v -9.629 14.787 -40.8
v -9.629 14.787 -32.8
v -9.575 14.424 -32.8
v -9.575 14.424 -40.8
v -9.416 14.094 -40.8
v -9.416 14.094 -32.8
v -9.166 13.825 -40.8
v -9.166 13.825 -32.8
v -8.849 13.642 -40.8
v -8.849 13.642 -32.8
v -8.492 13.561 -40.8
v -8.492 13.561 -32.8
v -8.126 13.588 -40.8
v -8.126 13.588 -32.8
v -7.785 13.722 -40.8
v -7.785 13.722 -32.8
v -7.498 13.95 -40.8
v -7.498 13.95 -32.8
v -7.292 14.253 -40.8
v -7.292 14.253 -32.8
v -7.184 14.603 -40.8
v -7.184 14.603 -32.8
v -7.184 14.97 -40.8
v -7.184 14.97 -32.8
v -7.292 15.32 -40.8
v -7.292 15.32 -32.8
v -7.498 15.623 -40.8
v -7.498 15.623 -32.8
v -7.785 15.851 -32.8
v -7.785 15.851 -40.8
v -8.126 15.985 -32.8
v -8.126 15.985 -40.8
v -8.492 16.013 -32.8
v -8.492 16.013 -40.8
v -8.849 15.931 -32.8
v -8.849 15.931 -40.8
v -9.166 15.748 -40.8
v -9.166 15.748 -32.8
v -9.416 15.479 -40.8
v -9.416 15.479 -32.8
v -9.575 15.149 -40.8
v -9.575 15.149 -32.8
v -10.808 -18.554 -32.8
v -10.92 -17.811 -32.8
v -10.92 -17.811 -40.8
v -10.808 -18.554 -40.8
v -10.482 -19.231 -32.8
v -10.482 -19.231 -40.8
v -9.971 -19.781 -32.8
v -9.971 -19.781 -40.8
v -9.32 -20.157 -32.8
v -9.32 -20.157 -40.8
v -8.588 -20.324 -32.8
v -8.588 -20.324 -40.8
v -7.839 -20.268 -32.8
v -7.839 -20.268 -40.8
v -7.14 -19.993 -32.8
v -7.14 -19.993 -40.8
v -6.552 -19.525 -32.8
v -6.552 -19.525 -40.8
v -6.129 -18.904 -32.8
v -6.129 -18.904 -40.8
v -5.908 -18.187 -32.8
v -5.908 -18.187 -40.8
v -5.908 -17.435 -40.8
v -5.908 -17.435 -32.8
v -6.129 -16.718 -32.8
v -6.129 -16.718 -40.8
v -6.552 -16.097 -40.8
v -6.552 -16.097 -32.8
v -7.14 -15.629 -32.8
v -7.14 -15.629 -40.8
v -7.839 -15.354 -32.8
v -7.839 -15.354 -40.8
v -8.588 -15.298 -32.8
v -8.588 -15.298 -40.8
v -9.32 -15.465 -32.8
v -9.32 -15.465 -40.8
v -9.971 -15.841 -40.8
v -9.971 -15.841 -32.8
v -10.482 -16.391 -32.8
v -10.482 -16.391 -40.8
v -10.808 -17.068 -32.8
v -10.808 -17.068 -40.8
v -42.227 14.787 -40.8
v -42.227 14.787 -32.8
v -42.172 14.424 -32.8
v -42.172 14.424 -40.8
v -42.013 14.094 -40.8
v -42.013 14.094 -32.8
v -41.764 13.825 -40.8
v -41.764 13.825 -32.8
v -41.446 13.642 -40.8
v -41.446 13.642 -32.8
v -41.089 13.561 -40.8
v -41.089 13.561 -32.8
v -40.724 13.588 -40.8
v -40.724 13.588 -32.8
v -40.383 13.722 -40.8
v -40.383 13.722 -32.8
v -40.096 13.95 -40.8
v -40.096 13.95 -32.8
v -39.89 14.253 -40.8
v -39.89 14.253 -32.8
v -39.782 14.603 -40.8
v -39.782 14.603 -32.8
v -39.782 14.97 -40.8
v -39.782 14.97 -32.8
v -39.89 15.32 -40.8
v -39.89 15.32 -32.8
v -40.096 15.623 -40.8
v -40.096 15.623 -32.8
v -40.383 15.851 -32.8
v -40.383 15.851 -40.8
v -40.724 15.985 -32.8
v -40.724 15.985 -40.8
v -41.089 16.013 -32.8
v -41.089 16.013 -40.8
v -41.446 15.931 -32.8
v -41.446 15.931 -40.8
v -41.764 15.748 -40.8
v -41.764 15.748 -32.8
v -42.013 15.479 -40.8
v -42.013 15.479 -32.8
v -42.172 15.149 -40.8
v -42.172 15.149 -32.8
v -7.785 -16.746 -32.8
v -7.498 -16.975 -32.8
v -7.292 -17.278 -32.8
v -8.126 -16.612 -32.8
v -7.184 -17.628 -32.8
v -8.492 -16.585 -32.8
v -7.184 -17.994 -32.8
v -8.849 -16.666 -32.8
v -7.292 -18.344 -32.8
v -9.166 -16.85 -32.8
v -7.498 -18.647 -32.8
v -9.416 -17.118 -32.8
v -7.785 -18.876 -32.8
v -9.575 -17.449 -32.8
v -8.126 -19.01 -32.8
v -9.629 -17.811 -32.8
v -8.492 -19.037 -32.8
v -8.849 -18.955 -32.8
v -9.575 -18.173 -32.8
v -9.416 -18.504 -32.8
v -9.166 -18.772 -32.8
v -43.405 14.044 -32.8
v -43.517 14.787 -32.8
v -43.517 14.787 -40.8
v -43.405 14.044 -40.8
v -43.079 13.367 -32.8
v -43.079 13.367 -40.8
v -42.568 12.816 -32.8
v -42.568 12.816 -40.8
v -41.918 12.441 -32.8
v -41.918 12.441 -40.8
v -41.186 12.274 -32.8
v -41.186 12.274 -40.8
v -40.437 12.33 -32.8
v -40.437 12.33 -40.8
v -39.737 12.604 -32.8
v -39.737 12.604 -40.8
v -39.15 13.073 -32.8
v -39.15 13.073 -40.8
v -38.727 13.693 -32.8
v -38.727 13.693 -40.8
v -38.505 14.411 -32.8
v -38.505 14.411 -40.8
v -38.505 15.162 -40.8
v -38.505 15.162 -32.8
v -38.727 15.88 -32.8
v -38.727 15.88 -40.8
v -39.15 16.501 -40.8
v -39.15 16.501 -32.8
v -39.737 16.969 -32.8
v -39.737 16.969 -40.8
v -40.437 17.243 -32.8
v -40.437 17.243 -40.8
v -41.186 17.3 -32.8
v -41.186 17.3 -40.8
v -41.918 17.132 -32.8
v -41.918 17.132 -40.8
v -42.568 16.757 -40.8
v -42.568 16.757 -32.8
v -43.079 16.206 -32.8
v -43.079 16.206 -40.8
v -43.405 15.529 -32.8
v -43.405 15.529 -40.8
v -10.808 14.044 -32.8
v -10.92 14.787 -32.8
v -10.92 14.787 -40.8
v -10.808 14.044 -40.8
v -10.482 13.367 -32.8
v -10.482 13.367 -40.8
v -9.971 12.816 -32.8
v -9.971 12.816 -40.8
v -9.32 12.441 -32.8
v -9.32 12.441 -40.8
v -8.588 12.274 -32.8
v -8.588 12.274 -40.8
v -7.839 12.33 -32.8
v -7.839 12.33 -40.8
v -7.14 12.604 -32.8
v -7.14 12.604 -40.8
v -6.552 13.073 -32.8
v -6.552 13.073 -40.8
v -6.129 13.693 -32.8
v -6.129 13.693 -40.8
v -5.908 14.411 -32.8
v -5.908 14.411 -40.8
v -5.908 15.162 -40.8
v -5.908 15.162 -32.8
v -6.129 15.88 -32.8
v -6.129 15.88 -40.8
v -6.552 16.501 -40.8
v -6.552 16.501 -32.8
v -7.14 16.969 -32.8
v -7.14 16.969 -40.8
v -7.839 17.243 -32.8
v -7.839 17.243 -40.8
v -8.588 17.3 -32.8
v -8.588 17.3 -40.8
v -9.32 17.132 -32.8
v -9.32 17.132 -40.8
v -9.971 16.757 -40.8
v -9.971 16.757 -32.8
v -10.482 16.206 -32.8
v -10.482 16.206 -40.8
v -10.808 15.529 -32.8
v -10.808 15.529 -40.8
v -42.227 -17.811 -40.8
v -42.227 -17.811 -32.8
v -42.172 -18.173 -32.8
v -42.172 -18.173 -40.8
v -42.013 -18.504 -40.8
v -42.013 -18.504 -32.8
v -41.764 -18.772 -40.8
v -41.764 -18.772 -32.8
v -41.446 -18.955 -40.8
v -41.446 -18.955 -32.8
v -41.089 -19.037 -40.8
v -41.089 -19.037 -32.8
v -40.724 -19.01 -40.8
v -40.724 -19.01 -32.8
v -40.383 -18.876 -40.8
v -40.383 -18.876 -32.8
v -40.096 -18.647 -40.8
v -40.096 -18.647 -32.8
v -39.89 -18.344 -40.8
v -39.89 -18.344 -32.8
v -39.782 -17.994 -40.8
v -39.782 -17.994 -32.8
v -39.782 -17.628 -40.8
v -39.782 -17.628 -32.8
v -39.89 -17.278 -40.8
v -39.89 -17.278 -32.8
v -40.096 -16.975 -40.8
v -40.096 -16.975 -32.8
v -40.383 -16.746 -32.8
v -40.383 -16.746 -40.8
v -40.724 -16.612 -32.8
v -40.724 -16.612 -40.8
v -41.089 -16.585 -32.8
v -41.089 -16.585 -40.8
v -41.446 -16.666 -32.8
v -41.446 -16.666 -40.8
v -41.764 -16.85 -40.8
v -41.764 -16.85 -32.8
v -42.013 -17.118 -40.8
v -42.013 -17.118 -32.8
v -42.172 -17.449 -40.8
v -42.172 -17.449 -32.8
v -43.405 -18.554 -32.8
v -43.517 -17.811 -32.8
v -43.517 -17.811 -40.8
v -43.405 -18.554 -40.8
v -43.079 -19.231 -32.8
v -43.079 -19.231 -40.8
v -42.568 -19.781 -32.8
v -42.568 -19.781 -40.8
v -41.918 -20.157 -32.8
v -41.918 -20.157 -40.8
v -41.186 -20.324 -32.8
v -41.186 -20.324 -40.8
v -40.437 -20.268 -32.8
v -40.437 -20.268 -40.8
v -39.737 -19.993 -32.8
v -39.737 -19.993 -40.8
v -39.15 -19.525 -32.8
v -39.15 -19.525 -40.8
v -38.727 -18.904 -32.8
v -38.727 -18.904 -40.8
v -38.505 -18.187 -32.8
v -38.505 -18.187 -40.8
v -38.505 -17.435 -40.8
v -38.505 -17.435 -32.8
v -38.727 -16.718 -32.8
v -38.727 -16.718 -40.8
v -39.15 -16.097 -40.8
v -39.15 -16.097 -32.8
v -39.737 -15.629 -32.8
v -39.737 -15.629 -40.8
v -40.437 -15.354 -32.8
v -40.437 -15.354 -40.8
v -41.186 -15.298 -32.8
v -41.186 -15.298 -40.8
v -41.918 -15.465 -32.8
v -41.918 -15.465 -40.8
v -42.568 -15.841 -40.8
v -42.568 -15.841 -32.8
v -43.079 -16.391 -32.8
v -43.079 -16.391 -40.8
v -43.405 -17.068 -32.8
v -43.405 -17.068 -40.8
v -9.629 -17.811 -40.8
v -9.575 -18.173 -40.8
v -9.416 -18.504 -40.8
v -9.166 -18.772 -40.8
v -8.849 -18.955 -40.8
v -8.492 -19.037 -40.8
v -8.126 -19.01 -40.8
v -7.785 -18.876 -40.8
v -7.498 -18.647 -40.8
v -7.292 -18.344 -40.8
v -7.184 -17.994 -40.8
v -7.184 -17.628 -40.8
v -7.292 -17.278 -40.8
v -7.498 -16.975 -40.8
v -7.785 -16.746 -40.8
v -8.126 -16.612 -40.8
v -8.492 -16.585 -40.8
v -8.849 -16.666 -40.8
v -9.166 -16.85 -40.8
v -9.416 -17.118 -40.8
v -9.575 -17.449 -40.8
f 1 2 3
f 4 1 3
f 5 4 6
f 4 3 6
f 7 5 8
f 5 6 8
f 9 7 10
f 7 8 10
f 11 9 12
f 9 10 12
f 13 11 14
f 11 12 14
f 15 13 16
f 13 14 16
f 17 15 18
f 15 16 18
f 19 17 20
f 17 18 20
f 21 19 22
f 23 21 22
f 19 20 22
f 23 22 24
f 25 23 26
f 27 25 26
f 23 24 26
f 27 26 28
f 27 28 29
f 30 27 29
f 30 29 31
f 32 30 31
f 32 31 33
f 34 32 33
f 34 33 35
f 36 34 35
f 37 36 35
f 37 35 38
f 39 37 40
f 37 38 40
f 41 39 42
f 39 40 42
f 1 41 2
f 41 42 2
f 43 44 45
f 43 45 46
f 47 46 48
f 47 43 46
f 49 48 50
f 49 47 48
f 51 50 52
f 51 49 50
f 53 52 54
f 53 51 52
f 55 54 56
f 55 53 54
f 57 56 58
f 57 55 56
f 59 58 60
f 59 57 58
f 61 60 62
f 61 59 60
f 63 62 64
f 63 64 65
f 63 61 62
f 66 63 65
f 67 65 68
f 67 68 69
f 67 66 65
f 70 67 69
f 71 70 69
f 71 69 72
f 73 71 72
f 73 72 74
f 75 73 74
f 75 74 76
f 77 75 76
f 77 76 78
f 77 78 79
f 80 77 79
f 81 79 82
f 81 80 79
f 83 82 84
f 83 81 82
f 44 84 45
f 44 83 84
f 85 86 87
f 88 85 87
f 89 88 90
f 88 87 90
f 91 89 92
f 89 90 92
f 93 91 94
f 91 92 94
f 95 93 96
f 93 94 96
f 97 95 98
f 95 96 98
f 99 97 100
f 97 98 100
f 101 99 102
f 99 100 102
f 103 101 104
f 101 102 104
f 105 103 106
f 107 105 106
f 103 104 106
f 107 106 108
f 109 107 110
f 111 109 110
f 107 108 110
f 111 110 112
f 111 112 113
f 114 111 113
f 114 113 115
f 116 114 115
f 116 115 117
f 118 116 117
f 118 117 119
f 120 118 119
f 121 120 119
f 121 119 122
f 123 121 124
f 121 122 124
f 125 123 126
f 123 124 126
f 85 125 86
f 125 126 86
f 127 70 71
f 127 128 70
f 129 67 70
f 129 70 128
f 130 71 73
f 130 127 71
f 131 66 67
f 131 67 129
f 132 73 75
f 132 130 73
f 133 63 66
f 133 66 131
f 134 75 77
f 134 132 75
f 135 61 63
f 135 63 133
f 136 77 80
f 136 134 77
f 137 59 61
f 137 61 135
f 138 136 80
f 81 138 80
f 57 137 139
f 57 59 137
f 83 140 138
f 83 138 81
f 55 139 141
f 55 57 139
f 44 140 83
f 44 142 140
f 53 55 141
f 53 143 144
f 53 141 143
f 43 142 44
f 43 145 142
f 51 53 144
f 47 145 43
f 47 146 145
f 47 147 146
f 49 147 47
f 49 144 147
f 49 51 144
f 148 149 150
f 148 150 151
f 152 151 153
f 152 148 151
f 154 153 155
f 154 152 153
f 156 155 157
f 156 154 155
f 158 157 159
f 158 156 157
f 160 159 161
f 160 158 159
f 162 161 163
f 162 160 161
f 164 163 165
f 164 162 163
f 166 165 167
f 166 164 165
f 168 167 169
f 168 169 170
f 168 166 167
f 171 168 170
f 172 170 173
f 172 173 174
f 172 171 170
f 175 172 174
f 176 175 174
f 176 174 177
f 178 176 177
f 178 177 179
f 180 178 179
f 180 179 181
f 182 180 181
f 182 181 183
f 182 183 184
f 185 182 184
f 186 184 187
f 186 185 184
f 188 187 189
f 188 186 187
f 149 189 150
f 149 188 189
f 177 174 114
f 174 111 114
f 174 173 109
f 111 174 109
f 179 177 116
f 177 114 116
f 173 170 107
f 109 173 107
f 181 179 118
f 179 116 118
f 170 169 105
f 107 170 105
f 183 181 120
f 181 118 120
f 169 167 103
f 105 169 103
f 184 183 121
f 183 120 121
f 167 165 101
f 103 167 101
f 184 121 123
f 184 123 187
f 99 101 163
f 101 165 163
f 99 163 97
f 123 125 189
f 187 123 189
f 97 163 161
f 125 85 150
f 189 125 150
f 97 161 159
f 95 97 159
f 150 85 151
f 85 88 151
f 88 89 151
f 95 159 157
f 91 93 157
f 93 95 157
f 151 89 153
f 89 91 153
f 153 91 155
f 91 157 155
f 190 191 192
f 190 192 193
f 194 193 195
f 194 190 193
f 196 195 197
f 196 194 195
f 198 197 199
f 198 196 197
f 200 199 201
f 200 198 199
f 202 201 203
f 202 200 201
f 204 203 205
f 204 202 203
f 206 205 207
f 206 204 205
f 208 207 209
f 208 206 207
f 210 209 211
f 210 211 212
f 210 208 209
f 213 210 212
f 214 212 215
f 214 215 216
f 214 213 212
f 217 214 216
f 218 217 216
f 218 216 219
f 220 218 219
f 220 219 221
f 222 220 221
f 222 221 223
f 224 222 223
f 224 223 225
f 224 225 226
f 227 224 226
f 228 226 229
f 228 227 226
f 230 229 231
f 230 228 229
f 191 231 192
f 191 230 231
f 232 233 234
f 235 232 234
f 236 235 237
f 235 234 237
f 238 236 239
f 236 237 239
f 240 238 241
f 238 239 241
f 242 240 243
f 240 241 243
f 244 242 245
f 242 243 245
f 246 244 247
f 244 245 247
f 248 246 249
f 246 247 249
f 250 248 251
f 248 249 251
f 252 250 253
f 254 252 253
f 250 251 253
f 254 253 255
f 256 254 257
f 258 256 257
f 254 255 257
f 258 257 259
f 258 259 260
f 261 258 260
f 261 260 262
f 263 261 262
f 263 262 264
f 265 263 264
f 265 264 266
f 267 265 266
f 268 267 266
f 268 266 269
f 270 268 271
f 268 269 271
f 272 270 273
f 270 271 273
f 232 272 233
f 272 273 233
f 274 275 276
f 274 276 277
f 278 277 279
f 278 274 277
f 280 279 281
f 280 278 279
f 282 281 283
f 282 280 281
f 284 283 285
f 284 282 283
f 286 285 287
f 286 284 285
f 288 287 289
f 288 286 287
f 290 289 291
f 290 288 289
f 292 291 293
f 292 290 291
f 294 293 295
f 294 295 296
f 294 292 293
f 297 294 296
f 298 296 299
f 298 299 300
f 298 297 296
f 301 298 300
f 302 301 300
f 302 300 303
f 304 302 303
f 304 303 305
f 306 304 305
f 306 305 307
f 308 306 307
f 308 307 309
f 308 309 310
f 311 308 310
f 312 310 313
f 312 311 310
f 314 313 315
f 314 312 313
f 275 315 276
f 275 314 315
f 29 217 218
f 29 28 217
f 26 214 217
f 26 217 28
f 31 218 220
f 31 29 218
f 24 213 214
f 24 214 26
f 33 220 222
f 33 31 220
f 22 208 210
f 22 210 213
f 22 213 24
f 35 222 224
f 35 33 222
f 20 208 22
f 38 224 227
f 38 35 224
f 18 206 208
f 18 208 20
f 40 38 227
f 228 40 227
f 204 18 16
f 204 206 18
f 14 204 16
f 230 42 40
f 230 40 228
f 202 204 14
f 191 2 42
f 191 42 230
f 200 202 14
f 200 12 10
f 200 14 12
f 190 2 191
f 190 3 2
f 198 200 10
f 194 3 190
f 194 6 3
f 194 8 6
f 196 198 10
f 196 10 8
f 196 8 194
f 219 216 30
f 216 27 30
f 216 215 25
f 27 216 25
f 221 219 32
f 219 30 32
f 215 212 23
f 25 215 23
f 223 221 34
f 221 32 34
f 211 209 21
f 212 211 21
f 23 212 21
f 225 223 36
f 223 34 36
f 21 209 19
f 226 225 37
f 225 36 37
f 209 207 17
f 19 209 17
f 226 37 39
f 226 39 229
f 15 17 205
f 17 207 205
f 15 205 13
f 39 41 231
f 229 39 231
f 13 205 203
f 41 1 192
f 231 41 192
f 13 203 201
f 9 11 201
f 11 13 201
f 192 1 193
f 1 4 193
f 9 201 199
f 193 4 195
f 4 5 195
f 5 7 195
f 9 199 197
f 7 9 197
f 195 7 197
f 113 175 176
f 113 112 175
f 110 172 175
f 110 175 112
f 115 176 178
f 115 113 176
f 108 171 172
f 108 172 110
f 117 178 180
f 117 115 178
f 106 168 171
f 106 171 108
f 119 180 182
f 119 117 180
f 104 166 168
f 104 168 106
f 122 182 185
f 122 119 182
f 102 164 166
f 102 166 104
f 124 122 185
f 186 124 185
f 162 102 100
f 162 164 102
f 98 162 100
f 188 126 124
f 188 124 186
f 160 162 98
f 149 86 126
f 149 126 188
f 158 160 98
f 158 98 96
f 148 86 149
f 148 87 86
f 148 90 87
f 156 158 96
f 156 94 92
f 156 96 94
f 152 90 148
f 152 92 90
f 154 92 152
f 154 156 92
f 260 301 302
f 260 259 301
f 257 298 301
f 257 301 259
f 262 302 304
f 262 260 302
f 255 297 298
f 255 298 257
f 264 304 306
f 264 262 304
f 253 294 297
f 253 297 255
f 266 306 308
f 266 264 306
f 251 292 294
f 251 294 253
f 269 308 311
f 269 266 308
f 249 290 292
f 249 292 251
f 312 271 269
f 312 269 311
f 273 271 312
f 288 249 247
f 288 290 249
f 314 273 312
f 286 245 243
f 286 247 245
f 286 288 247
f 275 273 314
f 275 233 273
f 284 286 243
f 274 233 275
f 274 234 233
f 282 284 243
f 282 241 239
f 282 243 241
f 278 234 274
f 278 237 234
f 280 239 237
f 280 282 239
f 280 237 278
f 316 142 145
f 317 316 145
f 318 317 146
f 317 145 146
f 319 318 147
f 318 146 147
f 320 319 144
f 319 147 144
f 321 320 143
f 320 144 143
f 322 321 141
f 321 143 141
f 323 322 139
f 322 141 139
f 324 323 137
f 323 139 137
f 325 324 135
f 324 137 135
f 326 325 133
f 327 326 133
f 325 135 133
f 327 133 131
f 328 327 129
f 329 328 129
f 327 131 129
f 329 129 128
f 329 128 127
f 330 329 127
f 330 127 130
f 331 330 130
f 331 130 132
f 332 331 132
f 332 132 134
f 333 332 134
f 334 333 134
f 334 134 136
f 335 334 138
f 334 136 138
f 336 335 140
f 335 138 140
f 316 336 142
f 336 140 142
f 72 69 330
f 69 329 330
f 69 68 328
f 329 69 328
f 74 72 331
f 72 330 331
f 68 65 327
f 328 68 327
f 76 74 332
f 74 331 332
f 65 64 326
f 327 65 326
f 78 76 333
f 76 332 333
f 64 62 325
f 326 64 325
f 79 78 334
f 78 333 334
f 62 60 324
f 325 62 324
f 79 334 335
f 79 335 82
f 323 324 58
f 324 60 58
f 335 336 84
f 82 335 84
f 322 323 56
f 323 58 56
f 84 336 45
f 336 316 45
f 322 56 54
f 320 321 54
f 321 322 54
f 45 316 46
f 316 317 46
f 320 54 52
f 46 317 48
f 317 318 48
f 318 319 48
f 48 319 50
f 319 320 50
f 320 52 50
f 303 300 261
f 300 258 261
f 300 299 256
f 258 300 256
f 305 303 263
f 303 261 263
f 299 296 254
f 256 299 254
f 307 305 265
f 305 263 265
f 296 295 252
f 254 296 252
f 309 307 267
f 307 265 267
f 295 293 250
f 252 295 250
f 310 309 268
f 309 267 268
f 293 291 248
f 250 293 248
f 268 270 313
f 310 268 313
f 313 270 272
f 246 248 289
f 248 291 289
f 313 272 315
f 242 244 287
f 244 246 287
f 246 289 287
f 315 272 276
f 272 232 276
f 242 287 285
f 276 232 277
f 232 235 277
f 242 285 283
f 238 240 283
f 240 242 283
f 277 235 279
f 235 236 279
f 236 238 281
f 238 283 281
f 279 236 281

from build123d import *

# Parameters (mm, degrees)
EXTRUDE_START     = -32.800418
SKETCH_1_R        = 2.52
SKETCH_1_R_2      = 1.2295
EXTRUDE_1_DEPTH   = 8
EXTRUDE_1_2_DEPTH = 8
EXTRUDE_1_3_DEPTH = 8
EXTRUDE_1_4_DEPTH = 8


with BuildPart() as part:
    # 草图1 → 凸台-拉伸1 (new body)
    with BuildSketch(Plane.XY.offset(EXTRUDE_START)):
        with Locations(Location((-40.997301149, 14.786658582, 0), (0, 0, 180))):
            Circle(SKETCH_1_R)
        with Locations(Location((-40.997301149, 14.786658582, 0), (0, 0, 180))):
            Circle(SKETCH_1_R_2, mode=Mode.SUBTRACT)
    extrude(amount=-EXTRUDE_1_DEPTH)


with BuildPart() as body_2:
    # 草图1 → Extrude 1 2 (new body)
    with BuildSketch(Plane.XY.offset(EXTRUDE_START)):
        with Locations(Location((-8.399679074, 14.786658582, 0), (0, 0, 180))):
            Circle(SKETCH_1_R)
        with Locations(Location((-8.399679074, 14.786658582, 0), (0, 0, 180))):
            Circle(SKETCH_1_R_2, mode=Mode.SUBTRACT)
    extrude(amount=-EXTRUDE_1_2_DEPTH)


with BuildPart() as body_3:
    # 草图1 → Extrude 1 3 (new body)
    with BuildSketch(Plane.XY.offset(EXTRUDE_START)):
        with Locations(Location((-8.399679074, -17.810963493, 0), (0, 0, 180))):
            Circle(SKETCH_1_R)
        with Locations(Location((-8.399679074, -17.810963493, 0), (0, 0, 180))):
            Circle(SKETCH_1_R_2, mode=Mode.SUBTRACT)
    extrude(amount=-EXTRUDE_1_3_DEPTH)


with BuildPart() as body_4:
    # 草图1 → Extrude 1 4 (new body)
    with BuildSketch(Plane.XY.offset(EXTRUDE_START)):
        with Locations(Location((-40.997301149, -17.810963493, 0), (0, 0, 180))):
            Circle(SKETCH_1_R)
        with Locations(Location((-40.997301149, -17.810963493, 0), (0, 0, 180))):
            Circle(SKETCH_1_R_2, mode=Mode.SUBTRACT)
    extrude(amount=-EXTRUDE_1_4_DEPTH)


solid = Compound([part.part, body_2.part, body_3.part, body_4.part])
